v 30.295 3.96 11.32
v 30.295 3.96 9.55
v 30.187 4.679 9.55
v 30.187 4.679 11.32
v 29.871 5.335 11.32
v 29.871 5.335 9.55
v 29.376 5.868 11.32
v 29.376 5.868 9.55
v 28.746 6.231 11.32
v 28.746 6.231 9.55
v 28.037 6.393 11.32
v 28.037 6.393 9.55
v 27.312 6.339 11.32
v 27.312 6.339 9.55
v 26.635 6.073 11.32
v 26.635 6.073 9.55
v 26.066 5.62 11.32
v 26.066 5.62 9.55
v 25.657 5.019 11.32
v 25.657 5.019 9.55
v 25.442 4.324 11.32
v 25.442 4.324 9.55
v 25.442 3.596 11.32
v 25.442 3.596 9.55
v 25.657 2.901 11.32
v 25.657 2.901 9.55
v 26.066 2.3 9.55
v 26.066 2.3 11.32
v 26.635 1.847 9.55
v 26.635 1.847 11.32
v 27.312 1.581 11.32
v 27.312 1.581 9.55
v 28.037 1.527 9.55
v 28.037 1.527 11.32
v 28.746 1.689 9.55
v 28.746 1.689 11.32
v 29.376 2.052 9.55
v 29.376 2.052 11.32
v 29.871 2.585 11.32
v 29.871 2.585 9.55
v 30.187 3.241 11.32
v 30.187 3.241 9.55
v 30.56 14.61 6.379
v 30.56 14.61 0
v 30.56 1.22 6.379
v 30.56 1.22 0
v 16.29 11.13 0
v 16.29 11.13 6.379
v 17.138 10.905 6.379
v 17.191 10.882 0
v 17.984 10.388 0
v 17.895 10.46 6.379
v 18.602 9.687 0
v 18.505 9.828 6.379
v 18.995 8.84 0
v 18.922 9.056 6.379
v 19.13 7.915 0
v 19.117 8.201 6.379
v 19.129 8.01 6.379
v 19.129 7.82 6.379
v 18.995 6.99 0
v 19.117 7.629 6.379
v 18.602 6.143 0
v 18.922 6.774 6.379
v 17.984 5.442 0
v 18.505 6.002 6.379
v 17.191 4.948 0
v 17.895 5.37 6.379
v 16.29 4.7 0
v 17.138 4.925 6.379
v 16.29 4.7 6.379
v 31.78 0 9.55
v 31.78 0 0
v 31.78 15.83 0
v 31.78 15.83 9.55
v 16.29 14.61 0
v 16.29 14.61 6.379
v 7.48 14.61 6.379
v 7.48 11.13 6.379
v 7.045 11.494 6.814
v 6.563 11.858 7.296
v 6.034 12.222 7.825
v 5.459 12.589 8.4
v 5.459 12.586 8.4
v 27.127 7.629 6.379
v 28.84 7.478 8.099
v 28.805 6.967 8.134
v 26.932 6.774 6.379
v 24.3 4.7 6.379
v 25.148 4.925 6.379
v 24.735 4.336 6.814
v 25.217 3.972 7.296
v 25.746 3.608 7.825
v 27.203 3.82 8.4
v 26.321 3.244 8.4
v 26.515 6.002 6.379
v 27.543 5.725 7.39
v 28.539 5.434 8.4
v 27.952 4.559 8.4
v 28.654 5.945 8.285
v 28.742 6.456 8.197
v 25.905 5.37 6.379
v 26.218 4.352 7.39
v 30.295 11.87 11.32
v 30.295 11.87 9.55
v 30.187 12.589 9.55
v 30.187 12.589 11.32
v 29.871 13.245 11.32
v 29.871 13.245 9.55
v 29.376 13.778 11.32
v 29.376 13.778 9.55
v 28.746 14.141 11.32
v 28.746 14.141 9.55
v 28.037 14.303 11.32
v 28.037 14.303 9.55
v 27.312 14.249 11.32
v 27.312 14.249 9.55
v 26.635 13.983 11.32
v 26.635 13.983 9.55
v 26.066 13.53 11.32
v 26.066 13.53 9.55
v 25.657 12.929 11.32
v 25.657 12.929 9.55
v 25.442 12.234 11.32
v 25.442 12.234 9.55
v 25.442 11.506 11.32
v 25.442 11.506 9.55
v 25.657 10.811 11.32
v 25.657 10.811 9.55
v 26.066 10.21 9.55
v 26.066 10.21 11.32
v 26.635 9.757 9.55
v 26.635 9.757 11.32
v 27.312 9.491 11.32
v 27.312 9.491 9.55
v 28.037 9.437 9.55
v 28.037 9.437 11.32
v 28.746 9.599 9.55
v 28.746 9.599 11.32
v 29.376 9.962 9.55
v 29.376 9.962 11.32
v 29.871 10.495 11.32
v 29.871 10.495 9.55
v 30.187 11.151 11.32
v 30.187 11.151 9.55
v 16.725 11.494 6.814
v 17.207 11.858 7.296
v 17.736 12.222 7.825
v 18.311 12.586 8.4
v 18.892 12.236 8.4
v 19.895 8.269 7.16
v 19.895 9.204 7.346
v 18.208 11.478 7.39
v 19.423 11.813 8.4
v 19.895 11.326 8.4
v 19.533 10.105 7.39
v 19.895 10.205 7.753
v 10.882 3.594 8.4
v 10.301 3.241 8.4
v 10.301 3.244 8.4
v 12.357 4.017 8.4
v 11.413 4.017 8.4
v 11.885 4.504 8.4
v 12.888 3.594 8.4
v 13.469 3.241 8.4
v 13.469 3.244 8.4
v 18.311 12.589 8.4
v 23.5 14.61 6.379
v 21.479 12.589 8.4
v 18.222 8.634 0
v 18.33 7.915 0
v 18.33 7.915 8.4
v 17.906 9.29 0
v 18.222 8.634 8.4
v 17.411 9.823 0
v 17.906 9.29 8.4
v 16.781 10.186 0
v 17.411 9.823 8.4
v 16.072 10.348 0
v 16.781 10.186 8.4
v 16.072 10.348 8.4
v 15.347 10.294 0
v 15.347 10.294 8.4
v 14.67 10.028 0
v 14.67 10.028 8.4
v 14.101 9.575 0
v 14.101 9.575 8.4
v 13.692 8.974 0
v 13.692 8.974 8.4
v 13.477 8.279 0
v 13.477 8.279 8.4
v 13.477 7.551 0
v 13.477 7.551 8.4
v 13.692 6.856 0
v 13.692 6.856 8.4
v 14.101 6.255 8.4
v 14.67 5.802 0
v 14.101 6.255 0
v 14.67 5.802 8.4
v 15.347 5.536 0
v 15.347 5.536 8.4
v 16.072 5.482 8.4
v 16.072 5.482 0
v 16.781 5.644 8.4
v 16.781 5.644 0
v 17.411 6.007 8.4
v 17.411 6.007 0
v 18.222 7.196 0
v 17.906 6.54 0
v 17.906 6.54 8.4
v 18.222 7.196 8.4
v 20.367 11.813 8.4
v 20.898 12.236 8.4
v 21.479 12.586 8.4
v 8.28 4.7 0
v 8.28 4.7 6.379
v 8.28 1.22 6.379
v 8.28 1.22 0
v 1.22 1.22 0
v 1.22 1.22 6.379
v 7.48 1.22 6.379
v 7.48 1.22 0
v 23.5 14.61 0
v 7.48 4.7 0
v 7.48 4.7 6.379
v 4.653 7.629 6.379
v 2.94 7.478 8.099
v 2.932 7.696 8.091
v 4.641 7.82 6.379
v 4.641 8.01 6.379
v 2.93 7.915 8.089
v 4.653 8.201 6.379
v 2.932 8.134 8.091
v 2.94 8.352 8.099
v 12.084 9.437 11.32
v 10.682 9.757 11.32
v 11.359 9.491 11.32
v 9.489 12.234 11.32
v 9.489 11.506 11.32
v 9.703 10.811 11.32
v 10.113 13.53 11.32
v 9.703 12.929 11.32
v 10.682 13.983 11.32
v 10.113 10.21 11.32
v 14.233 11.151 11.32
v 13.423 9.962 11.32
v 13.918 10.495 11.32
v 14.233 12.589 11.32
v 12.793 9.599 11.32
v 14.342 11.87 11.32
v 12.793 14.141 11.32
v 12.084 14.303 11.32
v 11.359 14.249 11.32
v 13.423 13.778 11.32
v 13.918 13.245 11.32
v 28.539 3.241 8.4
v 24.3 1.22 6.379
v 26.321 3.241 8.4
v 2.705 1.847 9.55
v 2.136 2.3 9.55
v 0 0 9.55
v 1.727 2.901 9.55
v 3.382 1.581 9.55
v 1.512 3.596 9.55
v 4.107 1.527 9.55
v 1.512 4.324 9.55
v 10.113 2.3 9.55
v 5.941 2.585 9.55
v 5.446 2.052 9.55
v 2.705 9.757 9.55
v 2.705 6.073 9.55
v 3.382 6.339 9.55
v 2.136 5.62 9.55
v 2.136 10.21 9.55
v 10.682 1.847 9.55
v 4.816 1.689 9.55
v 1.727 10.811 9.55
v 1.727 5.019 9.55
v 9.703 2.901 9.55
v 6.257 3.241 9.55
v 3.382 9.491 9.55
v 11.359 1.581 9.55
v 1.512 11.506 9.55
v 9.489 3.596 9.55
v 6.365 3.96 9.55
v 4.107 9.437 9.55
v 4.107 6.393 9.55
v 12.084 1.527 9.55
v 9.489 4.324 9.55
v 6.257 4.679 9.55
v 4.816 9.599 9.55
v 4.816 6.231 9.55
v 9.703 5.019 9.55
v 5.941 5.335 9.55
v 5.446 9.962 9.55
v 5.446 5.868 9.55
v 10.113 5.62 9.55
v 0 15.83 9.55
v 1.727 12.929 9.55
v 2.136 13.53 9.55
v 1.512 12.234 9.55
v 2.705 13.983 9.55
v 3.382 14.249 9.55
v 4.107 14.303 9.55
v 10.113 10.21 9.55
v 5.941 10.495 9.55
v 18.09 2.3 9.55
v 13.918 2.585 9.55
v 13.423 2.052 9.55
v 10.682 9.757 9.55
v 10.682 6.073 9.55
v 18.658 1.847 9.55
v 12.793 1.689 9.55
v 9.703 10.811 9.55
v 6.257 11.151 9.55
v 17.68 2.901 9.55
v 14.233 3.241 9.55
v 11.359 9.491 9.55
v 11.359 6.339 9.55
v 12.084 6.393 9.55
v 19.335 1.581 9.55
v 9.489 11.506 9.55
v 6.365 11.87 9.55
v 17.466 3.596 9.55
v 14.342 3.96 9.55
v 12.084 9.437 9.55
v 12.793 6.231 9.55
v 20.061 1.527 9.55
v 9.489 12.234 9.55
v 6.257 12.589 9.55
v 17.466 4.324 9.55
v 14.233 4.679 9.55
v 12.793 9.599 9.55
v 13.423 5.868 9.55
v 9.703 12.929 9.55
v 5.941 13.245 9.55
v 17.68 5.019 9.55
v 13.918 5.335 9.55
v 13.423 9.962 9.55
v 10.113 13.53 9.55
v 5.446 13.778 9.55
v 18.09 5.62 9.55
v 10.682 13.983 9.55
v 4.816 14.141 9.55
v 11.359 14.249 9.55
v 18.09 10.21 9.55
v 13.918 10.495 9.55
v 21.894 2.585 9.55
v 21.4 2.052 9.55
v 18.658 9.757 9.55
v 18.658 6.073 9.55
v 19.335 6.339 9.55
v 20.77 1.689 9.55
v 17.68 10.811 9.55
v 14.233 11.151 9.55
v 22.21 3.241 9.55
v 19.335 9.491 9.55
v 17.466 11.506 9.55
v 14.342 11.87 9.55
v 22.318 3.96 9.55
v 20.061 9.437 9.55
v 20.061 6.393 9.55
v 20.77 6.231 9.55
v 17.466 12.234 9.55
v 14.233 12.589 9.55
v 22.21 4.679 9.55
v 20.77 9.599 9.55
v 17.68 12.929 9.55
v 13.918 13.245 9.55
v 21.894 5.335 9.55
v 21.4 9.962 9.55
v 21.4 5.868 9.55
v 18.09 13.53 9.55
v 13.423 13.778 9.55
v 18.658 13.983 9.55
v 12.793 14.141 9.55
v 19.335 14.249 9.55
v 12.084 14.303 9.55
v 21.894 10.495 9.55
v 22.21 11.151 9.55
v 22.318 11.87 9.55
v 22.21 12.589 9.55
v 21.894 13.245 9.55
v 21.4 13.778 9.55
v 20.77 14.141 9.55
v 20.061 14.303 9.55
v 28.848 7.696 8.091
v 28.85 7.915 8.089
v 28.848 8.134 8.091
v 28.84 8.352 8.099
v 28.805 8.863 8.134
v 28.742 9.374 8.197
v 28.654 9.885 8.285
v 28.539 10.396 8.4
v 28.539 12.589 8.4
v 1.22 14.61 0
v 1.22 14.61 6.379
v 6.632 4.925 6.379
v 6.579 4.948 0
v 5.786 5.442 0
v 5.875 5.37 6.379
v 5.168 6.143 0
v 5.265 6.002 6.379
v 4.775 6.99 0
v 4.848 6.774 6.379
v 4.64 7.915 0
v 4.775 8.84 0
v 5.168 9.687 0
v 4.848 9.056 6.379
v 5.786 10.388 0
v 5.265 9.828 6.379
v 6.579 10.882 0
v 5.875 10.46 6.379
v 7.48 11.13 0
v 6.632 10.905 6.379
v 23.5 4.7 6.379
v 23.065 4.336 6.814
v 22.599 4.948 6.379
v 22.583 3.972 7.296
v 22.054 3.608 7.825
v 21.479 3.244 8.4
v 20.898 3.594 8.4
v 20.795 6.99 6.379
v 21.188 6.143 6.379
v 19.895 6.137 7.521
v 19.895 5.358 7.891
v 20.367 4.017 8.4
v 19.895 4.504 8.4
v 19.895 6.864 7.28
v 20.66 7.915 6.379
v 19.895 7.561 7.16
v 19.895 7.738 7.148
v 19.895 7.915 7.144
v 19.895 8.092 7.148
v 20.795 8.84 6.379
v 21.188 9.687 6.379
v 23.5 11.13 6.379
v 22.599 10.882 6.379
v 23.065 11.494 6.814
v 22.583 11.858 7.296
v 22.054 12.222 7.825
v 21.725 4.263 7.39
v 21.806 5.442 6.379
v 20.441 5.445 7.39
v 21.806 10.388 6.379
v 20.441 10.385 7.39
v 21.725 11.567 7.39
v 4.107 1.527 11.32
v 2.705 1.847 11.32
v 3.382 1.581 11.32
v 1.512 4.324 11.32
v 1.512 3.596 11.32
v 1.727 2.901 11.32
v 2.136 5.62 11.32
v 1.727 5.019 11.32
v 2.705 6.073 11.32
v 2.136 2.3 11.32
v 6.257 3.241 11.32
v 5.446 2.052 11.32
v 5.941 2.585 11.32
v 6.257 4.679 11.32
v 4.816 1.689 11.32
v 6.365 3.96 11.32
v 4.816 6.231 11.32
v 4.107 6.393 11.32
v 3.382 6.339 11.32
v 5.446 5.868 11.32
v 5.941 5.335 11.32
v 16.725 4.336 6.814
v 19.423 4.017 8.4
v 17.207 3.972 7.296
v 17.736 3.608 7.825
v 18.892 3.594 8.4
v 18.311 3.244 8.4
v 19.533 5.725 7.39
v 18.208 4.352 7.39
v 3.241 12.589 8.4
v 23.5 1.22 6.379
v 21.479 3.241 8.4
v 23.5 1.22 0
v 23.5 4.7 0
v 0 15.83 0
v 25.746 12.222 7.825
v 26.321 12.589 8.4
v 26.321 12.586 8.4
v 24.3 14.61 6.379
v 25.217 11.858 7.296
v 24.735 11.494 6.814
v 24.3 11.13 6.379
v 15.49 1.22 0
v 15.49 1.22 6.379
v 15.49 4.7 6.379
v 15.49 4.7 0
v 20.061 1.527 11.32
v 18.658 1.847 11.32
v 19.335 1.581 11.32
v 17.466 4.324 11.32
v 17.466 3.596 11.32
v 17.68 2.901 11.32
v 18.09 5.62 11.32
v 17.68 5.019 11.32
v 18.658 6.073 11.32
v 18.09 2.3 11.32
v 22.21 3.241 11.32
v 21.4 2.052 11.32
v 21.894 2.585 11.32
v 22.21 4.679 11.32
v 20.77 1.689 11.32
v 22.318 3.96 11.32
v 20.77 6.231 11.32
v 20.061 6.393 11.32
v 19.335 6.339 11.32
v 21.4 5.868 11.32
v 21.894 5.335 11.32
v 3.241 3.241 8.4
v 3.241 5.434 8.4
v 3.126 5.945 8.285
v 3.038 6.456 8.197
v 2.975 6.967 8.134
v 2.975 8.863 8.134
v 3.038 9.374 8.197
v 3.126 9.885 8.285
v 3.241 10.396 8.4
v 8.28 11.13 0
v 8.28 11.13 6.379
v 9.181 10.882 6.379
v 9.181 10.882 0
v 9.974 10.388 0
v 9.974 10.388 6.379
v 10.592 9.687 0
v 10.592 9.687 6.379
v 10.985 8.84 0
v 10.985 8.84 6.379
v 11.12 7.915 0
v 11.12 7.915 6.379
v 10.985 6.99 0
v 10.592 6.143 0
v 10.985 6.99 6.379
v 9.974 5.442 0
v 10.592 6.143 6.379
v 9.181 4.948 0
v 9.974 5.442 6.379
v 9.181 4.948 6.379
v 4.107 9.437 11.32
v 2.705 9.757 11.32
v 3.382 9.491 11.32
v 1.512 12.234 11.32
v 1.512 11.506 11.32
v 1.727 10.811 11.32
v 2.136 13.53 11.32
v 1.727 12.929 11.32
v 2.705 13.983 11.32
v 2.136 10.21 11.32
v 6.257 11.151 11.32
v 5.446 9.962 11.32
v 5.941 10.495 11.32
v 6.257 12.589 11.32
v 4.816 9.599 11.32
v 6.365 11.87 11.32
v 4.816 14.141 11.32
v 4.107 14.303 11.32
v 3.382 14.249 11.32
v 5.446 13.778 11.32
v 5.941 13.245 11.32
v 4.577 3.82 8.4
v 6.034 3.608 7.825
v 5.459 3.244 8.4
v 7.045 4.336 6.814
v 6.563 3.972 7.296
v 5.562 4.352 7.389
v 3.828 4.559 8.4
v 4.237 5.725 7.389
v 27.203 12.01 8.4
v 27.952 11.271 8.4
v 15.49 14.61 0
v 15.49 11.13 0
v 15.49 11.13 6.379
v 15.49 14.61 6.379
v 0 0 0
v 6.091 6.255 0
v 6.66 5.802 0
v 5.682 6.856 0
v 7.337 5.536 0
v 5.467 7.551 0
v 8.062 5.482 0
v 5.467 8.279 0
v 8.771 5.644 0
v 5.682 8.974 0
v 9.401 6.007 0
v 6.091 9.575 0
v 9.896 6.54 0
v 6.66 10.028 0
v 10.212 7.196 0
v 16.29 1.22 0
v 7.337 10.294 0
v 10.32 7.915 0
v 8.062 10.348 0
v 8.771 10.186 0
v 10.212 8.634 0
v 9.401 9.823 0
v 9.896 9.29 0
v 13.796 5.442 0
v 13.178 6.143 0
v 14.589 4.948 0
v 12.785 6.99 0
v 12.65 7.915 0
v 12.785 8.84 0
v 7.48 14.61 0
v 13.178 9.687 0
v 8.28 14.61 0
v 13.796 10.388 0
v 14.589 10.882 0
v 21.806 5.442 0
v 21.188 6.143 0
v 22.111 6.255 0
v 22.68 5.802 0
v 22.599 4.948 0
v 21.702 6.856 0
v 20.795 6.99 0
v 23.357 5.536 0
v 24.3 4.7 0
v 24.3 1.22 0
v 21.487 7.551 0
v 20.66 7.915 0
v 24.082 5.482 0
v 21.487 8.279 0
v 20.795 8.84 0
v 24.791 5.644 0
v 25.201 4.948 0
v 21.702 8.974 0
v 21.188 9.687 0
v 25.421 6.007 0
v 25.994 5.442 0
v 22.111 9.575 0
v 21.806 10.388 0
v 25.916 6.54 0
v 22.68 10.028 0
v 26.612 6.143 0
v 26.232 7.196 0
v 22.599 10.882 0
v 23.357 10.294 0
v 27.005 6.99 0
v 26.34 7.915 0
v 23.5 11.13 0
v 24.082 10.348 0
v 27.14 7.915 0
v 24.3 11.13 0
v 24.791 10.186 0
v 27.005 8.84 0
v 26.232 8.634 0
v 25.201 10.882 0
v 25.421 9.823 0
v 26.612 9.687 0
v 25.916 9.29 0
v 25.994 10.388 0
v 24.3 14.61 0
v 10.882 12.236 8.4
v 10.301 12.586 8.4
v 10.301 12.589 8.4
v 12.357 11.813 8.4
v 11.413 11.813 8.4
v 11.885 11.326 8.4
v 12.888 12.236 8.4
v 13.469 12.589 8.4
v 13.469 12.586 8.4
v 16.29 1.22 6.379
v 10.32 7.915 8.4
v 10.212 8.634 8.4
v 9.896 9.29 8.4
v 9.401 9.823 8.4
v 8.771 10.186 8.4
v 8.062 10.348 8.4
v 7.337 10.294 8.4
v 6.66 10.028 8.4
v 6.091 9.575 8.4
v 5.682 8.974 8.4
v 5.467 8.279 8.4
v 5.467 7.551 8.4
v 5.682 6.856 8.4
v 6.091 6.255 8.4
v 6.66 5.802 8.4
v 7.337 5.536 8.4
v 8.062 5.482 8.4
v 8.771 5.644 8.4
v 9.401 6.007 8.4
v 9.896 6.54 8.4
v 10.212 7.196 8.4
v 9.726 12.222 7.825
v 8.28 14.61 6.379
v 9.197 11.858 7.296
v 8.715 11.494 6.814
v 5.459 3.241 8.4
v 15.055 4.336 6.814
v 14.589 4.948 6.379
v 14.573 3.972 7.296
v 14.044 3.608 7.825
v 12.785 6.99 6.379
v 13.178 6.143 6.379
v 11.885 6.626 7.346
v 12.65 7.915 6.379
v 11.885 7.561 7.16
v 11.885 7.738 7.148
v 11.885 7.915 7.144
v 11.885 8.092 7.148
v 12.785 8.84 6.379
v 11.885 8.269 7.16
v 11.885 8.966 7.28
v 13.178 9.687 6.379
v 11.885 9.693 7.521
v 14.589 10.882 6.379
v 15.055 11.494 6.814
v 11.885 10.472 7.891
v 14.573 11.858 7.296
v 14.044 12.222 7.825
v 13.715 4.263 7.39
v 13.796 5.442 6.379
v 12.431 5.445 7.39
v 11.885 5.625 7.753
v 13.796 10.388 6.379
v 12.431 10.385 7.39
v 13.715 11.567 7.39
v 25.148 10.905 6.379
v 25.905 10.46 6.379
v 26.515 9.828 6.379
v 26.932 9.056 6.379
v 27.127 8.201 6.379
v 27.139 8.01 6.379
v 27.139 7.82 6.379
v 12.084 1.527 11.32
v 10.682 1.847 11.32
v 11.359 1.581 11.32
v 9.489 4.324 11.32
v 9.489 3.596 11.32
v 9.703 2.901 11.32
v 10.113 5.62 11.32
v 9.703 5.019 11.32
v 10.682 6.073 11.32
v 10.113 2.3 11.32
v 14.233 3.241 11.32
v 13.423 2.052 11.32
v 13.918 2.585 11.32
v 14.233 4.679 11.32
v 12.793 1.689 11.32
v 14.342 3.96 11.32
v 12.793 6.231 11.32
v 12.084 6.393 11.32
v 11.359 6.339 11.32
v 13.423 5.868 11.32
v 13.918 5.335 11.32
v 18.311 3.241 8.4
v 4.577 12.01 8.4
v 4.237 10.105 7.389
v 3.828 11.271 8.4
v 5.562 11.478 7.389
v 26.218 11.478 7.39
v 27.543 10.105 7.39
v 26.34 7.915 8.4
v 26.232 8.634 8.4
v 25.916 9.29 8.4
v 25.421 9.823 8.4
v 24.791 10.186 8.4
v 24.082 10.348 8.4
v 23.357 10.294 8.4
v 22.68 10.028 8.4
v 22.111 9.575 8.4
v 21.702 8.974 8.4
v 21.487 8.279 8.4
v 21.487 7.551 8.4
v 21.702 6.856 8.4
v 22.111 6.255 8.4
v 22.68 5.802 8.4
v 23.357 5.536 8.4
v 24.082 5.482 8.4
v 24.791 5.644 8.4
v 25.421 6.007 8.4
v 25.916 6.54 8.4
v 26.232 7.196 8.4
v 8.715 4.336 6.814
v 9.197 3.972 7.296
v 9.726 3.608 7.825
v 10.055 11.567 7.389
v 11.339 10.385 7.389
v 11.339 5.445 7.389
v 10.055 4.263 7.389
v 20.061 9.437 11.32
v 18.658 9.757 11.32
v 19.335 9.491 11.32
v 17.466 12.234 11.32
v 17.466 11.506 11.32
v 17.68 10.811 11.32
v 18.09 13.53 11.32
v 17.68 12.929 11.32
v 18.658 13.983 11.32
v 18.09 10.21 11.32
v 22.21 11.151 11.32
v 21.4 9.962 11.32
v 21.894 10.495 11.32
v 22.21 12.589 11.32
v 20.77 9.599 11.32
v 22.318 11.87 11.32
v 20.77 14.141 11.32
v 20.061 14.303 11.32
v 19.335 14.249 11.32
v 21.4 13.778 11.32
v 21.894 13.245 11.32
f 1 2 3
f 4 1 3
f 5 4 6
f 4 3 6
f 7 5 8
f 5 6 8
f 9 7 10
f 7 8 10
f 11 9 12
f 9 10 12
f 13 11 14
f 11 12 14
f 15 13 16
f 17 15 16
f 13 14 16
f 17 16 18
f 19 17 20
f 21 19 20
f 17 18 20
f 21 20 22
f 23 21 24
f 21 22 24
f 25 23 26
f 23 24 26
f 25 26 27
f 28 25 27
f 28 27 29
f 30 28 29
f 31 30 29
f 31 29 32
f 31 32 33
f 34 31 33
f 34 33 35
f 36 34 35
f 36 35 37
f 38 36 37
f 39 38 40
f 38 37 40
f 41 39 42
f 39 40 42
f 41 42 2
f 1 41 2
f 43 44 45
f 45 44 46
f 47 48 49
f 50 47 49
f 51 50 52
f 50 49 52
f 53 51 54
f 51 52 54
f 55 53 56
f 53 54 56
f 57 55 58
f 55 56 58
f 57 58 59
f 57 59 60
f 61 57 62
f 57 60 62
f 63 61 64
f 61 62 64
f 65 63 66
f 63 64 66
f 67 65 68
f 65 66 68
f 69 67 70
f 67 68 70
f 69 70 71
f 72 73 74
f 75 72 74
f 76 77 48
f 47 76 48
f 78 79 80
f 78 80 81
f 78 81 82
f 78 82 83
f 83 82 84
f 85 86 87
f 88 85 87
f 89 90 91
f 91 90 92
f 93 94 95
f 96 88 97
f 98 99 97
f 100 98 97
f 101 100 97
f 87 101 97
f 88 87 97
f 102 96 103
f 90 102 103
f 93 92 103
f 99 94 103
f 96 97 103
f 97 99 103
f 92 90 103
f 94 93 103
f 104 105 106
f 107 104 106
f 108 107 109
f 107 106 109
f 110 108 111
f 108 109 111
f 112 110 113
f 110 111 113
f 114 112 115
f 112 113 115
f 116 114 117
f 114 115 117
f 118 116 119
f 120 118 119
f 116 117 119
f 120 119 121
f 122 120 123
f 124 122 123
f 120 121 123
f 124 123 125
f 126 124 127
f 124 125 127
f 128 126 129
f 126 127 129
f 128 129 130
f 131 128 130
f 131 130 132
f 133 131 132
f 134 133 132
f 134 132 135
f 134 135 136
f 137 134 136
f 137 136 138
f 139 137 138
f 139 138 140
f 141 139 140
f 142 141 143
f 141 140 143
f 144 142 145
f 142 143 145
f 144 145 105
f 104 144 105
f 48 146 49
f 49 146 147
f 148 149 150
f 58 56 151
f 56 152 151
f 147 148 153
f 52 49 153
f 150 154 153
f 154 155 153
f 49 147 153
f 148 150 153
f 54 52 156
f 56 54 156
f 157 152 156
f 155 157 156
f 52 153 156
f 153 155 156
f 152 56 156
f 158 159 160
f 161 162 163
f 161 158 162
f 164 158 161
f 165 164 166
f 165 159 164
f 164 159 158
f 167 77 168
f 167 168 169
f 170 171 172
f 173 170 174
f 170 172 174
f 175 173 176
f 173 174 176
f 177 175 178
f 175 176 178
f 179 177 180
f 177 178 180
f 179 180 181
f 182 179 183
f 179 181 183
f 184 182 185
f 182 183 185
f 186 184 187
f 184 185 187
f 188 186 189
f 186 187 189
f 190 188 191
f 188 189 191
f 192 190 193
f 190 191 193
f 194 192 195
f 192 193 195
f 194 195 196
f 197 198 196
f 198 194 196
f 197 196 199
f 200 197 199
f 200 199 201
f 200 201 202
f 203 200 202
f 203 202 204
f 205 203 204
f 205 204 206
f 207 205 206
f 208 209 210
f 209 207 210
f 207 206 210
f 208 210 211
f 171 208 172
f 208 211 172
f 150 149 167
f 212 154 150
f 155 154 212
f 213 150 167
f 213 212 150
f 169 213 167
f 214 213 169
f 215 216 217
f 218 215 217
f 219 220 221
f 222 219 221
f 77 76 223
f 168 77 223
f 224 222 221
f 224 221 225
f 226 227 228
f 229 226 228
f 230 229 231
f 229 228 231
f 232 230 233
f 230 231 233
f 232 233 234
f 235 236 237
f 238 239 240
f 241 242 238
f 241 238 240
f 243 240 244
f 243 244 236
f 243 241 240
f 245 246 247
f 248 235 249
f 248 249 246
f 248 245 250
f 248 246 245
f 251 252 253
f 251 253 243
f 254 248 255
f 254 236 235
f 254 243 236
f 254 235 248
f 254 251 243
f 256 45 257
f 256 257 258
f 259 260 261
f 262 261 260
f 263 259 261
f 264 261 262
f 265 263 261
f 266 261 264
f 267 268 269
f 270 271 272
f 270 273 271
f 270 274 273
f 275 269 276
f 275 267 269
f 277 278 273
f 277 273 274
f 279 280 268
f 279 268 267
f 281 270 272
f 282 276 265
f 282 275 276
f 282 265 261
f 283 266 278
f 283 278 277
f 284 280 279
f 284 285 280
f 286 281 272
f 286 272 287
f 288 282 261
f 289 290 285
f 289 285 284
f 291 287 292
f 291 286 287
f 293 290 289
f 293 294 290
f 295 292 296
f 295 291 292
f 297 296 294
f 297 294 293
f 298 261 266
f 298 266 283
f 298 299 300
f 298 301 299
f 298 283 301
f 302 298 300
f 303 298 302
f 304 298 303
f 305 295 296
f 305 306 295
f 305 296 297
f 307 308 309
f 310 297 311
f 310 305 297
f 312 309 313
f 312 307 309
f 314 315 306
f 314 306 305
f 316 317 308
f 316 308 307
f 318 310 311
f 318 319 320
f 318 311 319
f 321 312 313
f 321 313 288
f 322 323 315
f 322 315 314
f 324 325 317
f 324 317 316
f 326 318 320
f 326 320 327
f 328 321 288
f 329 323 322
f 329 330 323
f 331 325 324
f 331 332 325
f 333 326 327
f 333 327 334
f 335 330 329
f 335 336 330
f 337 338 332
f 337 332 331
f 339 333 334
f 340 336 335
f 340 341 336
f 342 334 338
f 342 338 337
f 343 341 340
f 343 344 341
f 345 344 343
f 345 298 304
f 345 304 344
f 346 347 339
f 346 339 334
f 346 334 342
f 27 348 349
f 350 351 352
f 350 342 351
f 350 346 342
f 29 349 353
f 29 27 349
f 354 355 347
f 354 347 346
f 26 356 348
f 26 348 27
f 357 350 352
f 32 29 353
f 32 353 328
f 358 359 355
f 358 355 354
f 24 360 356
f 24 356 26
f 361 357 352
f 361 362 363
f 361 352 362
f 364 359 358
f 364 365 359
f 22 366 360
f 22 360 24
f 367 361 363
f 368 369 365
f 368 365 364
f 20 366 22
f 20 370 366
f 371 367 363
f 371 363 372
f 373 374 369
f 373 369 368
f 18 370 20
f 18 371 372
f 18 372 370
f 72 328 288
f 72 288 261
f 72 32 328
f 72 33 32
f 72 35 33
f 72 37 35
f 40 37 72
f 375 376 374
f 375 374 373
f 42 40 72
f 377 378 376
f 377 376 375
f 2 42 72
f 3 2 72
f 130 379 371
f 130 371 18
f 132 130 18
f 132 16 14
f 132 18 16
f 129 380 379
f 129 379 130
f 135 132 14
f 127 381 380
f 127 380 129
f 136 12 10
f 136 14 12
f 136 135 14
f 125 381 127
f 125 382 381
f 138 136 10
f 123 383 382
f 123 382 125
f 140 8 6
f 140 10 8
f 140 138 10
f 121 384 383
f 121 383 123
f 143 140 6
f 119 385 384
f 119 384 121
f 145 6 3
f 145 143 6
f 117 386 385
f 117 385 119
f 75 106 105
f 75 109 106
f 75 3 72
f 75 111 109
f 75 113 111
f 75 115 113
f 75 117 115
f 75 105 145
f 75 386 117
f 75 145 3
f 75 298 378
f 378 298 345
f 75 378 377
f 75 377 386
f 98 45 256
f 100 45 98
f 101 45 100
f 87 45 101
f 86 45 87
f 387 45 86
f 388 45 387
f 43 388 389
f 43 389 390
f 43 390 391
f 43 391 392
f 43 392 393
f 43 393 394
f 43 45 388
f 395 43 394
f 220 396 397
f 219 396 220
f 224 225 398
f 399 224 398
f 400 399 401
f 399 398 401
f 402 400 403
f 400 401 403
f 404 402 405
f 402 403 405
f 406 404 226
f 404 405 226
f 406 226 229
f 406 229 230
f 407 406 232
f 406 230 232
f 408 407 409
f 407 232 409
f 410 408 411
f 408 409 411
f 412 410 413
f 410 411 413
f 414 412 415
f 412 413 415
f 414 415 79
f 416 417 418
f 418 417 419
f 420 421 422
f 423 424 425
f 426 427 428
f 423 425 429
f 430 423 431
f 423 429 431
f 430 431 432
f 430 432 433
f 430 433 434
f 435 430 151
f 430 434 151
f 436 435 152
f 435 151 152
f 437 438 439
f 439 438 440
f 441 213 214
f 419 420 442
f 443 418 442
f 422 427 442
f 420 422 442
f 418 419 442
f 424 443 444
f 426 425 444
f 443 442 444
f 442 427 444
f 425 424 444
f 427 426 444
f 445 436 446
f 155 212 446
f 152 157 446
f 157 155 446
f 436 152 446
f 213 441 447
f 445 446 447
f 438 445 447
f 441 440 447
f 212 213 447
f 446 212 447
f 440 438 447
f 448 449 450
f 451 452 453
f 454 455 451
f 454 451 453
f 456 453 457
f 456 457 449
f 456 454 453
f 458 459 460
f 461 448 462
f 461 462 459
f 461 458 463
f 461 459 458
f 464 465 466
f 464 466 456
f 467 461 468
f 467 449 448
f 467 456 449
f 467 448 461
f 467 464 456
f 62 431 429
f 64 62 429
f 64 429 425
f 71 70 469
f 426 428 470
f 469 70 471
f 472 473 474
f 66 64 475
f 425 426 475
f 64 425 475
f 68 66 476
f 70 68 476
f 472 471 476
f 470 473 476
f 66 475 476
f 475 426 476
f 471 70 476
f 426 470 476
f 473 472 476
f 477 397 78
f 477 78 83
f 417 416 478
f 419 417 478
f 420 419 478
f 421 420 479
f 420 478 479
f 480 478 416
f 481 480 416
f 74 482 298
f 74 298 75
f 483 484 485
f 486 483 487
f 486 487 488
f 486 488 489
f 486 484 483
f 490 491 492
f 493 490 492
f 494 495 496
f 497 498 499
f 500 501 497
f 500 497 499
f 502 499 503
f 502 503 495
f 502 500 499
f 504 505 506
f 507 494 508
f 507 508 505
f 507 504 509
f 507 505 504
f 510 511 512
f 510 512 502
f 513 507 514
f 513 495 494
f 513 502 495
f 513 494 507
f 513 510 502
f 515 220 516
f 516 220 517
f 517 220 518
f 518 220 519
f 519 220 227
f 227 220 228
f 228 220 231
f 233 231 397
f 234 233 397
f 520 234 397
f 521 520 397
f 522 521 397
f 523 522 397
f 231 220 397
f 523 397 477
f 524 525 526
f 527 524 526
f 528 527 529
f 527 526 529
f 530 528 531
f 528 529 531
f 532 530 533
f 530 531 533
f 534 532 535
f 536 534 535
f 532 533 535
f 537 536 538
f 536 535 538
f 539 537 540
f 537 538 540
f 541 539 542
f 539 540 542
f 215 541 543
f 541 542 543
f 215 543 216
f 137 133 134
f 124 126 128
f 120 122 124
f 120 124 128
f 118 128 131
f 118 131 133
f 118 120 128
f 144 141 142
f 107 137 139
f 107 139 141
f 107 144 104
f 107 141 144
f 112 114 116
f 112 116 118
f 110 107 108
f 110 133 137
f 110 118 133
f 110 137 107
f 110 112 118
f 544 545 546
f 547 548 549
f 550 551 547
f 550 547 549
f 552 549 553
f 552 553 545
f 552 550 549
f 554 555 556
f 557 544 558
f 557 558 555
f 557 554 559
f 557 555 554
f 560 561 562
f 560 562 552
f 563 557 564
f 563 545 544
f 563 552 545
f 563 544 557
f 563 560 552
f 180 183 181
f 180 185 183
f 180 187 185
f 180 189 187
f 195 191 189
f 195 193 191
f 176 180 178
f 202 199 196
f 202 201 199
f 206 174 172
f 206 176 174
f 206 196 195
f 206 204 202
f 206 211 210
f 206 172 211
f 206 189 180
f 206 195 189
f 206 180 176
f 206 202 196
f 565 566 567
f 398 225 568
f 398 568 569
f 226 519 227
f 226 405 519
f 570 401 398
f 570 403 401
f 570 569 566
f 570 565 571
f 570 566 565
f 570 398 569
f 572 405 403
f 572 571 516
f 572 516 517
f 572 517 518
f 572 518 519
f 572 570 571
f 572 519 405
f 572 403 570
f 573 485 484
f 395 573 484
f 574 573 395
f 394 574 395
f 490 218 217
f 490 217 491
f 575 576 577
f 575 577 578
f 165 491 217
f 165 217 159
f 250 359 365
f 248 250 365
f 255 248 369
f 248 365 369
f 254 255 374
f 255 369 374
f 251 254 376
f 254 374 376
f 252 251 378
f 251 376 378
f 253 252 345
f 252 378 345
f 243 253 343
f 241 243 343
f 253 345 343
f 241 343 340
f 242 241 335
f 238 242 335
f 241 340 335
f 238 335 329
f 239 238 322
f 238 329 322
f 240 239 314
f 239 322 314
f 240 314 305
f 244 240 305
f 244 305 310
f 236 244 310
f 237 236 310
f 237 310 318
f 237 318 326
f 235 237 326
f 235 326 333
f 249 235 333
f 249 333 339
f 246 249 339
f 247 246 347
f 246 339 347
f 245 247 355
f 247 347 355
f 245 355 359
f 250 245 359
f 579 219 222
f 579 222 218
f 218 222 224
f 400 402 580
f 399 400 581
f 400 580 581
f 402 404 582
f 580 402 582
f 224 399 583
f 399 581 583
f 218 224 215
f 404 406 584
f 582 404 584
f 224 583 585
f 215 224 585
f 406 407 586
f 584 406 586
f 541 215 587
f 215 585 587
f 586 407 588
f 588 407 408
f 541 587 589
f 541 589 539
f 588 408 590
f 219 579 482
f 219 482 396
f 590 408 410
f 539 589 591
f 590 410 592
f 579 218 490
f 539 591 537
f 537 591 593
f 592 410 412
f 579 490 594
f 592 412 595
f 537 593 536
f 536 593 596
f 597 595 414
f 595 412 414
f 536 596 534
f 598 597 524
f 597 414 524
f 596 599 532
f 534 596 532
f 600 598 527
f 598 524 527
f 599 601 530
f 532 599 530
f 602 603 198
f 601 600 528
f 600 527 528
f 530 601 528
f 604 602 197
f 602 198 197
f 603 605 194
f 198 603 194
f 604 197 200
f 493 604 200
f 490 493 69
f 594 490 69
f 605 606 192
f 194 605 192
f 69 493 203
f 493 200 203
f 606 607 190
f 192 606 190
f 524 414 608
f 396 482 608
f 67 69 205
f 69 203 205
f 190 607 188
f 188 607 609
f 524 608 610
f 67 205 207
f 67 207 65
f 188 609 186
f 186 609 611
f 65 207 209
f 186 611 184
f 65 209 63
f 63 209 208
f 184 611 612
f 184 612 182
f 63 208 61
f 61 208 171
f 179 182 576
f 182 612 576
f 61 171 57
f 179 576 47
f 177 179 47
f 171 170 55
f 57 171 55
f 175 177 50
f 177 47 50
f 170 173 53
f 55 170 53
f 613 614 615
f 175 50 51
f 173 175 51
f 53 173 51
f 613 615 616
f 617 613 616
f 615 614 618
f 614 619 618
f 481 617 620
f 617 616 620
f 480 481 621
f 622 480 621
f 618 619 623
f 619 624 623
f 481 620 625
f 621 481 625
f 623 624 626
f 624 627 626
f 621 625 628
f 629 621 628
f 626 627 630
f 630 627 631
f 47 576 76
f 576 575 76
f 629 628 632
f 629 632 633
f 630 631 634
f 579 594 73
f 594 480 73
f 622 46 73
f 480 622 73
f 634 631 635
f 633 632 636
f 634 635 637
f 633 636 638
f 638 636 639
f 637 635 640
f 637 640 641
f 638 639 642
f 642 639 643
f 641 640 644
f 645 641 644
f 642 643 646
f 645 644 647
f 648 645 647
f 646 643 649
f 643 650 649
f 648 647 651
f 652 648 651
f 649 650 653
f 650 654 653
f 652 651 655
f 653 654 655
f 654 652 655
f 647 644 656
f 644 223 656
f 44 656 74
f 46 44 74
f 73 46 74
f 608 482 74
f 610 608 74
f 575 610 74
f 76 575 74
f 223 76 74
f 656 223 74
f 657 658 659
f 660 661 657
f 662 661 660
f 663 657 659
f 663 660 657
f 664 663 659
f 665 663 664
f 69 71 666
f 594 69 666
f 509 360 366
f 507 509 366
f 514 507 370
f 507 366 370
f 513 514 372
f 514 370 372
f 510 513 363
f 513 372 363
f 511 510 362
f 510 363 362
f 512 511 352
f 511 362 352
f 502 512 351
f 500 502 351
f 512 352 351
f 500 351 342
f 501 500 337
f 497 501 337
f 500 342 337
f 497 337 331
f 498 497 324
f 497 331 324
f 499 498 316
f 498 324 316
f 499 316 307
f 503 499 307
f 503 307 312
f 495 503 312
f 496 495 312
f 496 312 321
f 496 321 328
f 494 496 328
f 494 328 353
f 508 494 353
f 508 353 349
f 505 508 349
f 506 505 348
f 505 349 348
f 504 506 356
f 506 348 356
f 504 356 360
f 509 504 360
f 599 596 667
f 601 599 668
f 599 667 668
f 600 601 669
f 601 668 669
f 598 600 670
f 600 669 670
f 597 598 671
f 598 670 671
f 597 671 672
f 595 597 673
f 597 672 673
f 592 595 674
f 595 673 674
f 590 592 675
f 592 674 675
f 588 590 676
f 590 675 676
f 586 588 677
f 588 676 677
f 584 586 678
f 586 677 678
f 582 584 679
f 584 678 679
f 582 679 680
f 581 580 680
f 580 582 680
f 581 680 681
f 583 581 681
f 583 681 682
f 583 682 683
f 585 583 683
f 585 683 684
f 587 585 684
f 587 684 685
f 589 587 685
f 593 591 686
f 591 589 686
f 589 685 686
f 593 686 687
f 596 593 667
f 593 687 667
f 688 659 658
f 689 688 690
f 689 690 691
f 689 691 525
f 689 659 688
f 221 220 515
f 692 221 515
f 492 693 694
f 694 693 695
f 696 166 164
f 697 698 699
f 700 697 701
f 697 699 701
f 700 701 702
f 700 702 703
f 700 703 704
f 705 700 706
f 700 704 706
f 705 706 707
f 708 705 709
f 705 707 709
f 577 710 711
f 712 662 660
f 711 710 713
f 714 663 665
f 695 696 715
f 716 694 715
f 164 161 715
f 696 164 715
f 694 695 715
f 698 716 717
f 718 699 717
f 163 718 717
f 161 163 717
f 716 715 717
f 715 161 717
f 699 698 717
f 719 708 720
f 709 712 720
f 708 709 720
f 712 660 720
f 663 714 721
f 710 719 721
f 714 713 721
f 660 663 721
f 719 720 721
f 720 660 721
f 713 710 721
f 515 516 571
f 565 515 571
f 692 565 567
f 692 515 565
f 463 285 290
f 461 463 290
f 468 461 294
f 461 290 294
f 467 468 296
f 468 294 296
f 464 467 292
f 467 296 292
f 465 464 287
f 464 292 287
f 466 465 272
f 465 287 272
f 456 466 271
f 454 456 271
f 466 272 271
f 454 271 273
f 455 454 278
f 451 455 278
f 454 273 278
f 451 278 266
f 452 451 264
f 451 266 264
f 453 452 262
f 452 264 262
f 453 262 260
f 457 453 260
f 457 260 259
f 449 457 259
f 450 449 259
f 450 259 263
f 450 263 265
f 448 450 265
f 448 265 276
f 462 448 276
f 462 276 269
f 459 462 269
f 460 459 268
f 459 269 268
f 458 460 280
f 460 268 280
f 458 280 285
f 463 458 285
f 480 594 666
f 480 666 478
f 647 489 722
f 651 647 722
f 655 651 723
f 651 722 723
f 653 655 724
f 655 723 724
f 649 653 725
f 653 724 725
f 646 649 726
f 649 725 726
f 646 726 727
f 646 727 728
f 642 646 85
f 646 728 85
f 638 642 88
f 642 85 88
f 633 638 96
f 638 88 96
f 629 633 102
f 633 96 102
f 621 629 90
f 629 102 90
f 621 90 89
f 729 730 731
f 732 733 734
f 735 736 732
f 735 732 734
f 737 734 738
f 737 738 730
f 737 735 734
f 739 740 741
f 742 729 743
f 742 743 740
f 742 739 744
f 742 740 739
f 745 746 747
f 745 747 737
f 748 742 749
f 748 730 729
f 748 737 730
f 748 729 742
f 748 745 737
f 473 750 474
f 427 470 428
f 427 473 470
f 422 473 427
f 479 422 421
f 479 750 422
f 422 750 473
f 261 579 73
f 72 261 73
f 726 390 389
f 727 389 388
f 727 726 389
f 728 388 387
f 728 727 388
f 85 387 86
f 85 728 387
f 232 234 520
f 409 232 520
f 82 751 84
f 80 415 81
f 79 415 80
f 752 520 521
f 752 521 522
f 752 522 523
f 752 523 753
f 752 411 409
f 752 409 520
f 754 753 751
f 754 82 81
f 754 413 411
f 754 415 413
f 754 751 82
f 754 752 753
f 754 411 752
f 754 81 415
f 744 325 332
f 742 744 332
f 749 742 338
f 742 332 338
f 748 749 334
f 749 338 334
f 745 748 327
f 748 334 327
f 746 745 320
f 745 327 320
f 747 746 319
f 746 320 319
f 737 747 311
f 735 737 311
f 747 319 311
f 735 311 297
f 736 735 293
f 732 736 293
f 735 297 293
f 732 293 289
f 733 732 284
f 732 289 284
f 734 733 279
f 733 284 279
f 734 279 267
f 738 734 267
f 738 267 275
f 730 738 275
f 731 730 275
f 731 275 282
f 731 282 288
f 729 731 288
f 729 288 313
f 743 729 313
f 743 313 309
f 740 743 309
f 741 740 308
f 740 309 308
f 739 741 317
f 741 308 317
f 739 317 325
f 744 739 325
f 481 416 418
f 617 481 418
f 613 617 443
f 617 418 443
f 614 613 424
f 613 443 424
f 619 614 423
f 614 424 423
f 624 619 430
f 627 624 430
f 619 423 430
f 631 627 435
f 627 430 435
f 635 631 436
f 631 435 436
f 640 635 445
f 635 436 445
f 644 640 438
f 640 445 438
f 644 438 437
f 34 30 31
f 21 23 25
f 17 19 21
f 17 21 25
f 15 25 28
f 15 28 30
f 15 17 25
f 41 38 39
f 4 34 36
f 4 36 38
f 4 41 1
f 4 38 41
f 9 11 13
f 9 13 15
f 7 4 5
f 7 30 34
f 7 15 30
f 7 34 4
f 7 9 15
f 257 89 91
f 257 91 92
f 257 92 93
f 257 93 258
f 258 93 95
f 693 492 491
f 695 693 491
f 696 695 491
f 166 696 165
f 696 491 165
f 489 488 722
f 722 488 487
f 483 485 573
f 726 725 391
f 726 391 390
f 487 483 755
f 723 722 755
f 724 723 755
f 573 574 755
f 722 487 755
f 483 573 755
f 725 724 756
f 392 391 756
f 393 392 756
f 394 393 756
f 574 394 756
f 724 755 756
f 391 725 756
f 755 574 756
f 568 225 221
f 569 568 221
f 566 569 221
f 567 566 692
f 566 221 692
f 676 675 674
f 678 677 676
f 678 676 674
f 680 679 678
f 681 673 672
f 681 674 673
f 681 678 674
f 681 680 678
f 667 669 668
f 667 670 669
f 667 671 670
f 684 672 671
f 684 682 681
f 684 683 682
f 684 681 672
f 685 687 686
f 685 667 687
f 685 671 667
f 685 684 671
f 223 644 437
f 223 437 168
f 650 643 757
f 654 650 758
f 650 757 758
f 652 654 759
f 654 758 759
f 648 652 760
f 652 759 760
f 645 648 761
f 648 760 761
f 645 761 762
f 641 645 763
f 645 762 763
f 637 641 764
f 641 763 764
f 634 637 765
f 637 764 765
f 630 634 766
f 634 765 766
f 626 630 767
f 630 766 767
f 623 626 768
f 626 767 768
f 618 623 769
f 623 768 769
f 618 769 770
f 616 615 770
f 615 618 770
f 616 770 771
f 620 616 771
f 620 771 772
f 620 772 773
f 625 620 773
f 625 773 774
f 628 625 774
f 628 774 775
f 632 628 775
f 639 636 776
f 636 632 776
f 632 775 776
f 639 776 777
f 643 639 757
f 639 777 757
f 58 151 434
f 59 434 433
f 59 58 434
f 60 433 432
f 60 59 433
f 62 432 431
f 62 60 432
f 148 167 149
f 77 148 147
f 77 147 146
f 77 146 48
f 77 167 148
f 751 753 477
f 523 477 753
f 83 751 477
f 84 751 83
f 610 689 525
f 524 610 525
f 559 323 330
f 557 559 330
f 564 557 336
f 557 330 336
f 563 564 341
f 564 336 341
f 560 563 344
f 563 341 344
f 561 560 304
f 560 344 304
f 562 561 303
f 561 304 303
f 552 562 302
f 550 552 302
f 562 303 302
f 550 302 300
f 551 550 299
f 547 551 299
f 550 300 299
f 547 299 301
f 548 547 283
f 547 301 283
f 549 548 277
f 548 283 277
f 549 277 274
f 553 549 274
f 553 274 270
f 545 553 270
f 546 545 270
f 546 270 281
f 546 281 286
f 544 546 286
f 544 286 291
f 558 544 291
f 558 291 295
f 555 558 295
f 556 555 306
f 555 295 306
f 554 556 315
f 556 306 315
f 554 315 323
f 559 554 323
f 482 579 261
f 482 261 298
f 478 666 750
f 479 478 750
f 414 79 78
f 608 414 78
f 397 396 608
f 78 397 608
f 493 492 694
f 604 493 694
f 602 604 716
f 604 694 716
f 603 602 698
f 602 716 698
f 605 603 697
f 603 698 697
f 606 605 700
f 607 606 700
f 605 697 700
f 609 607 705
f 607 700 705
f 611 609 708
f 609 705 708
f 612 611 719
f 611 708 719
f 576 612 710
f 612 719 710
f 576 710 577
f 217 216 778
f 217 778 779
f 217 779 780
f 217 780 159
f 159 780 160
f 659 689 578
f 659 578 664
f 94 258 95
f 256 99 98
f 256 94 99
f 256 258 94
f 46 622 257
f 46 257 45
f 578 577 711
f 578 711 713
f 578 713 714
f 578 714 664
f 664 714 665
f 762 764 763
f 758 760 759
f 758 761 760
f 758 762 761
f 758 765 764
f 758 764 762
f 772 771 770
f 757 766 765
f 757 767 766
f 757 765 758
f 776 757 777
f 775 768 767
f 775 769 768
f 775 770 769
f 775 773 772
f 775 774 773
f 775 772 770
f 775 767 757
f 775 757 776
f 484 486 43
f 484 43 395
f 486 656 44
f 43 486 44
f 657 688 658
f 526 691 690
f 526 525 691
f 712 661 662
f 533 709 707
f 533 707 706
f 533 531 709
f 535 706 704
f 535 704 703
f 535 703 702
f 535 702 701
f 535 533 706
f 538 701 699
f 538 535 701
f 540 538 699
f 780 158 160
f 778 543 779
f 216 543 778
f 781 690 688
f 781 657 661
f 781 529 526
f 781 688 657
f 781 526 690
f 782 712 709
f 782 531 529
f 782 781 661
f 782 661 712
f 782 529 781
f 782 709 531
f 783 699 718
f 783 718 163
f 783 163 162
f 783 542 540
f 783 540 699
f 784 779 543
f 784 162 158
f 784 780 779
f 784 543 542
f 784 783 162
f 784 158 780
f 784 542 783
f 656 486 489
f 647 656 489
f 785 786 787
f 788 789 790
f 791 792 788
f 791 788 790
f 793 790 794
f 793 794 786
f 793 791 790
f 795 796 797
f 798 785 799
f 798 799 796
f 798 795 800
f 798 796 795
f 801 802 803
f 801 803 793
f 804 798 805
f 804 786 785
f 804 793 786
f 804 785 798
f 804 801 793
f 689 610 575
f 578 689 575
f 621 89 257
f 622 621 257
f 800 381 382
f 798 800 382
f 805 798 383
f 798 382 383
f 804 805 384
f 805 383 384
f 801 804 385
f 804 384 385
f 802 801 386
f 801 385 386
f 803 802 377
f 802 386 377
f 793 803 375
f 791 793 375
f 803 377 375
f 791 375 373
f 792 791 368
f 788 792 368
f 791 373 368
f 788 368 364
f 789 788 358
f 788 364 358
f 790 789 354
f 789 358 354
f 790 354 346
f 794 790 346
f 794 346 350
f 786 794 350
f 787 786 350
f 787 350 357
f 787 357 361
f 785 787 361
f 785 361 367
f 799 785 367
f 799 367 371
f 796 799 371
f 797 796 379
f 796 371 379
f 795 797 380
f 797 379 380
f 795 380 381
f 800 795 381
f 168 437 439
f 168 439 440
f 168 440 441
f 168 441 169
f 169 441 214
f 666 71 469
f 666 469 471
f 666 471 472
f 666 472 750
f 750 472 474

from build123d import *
from build123d import SkipClean  # not in build123d's __all__

# Parameters (mm, degrees)
F0_W         = 31.78
F0_H         = 15.83
F1_DEPTH     = 9.55
F2_R         = 2.44
F3_DEPTH     = 1.77
F4_W         = 29.34
F4_H         = 13.39
F5_DEPTH     = 8.4
F6_R         = 2.44
F7_DEPTH     = 8.4
F8_T1_DEPTH  = 17.6047426374
F8_T3_DEPTH  = 17.6047426374
F8_T5_DEPTH  = 11.4573713187
F8_T7_DEPTH  = 11.4573713187
F8_T9_DEPTH  = 13.39
F8_T14_DEPTH = 8.6771574844
F8_S15_R     = 2.44
F8_T16_DEPTH = 6
F8_T18_ANGLE = 349.8869381759
F8_T22_DEPTH = 8.6771574844
F8_S23_R     = 2.44
F8_T24_DEPTH = 6
F8_T28_DEPTH = 8.6771574844
F8_S29_R     = 2.44
F8_T30_DEPTH = 6
F8_T32_ANGLE = 349.8869381759
F8_T36_DEPTH = 8.6771574844
F8_S37_R     = 2.44
F8_T38_DEPTH = 6
F8_T42_DEPTH = 8.6771574844
F8_S43_R     = 2.44
F8_T44_DEPTH = 6
F8_T46_ANGLE = 349.8869381759
F8_T50_DEPTH = 8.6771574844
F8_S51_R     = 2.44
F8_T52_DEPTH = 6
F8_T56_DEPTH = 8.6771574844
F8_S57_R     = 2.44
F8_T58_DEPTH = 6
F8_T60_ANGLE = 349.8869381759
F8_T64_DEPTH = 8.6771574844
F8_S65_R     = 2.44
F8_T66_DEPTH = 6
F8_T70_DEPTH = 8.6771574844
F8_S71_R     = 2.44
F8_T72_DEPTH = 6
F8_T76_DEPTH = 8.6771574844
F8_S77_R     = 2.44
F8_T78_DEPTH = 6
F8_T80_ANGLE = 349.8869381759
F8_T84_DEPTH = 8.6771574844
F8_S85_R     = 2.44
F8_T86_DEPTH = 6
F8_T88_ANGLE = 349.8869381759
F8_T92_DEPTH = 8.6771574844
F8_S93_R     = 2.44
F8_T94_DEPTH = 6


# Not quite as in the source:
# - a fillet or chamfer that OpenCascade refuses, or shapes differently, is made with other operations: its cross-section is extruded or revolved along the edge and cut away or added


with BuildPart() as f1:
    # F0 (on Top) → F1 (new body)
    with BuildSketch(Plane.XY):
        with Locations((15.89, 7.915)):
            Rectangle(F0_W, F0_H)
    extrude(amount=F1_DEPTH)

    # F2 (on face) → F3 (join)
    with BuildSketch(Plane.XY.offset(9.55)):
        with Locations((27.855, 3.96)):
            Circle(F2_R)
        with Locations((27.855, 11.87)):
            Circle(F2_R)
        with Locations((19.8783333333, 3.96)):
            Circle(F2_R)
        with Locations((19.8783333333, 11.87)):
            Circle(F2_R)
        with Locations((11.9016666667, 3.96)):
            Circle(F2_R)
        with Locations((11.9016666667, 11.87)):
            Circle(F2_R)
        with Locations((3.925, 3.96)):
            Circle(F2_R)
        with Locations((3.925, 11.87)):
            Circle(F2_R)
    extrude(amount=F3_DEPTH)

    # F4 (on face) → F5 (cut)
    with BuildSketch(Plane(origin=(0, 0, 0), x_dir=(1, 0, 0), z_dir=(0, 0, -1))):
        with Locations((15.89, -7.915)):
            Rectangle(F4_W, F4_H)
    extrude(amount=-F5_DEPTH, mode=Mode.SUBTRACT)

    # F6 (on face) → F7 (join, through all)
    with BuildSketch(Plane(origin=(0, 0, 8.4), x_dir=(1, 0, 0), z_dir=(0, 0, -1))):
        with BuildLine():
            Line((15.49, -1.22), (15.49, -4.6997861657))
            ThreePointArc((15.49, -4.6997861657), (12.65, -7.915), (15.49, -11.1302138343))
            Line((15.49, -11.1302138343), (15.49, -14.61))
            Line((15.49, -14.61), (16.29, -14.61))
            Line((16.29, -14.61), (16.29, -11.1302138343))
            ThreePointArc((16.29, -11.1302138343), (19.13, -7.915), (16.29, -4.6997861657))
            Line((16.29, -4.6997861657), (16.29, -1.22))
            Line((16.29, -1.22), (15.49, -1.22))
        make_face()
        with Locations((15.89, -7.915)):
            Circle(F6_R, mode=Mode.SUBTRACT)
        with BuildLine():
            Line((24.3, -14.61), (24.3, -11.1302138343))
            ThreePointArc((24.3, -11.1302138343), (27.14, -7.915), (24.3, -4.6997861657))
            Line((24.3, -4.6997861657), (24.3, -1.22))
            Line((24.3, -1.22), (23.5, -1.22))
            Line((23.5, -1.22), (23.5, -4.6997861657))
            ThreePointArc((23.5, -4.6997861657), (20.66, -7.915), (23.5, -11.1302138343))
            Line((23.5, -11.1302138343), (23.5, -14.61))
            Line((23.5, -14.61), (24.3, -14.61))
        make_face()
        with Locations((23.9, -7.915)):
            Circle(F6_R, mode=Mode.SUBTRACT)
        with BuildLine():
            ThreePointArc((8.28, -11.1302138343), (11.12, -7.915), (8.28, -4.6997861657))
            Line((8.28, -4.6997861657), (8.28, -1.22))
            Line((8.28, -1.22), (7.48, -1.22))
            Line((7.48, -1.22), (7.48, -4.6997861657))
            ThreePointArc((7.48, -4.6997861657), (4.64, -7.915), (7.48, -11.1302138343))
            Line((7.48, -11.1302138343), (7.48, -14.61))
            Line((7.48, -14.61), (8.28, -14.61))
            Line((8.28, -14.61), (8.28, -11.1302138343))
        make_face()
        with Locations((7.88, -7.915)):
            Circle(F6_R, mode=Mode.SUBTRACT)
    extrude(amount=F7_DEPTH)

    # F8: chamfer of 2.021 on 28 edges, made by hand

    # F8_s2 → F8_t1 (join)
    with BuildSketch(Plane.YZ.offset(3.0826286813)):
        Polygon((1.22, 6.379), (3.241, 8.4), (1.22, 8.4), align=None)
        Polygon((14.61, 6.379), (12.589, 8.4), (14.61, 8.4), align=None)
    extrude(amount=F8_T1_DEPTH)

    # F8_s4 → F8_t3 (join)
    with BuildSketch(Plane.YZ.offset(11.0926286813)):
        Polygon((1.22, 6.379), (3.241, 8.4), (1.22, 8.4), align=None)
        Polygon((14.61, 6.379), (12.589, 8.4), (14.61, 8.4), align=None)
    extrude(amount=F8_T3_DEPTH)

    # F8_s6 → F8_t5 (join)
    with BuildSketch(Plane.YZ.offset(19.1026286813)):
        Polygon((1.22, 6.379), (3.241, 8.4), (1.22, 8.4), align=None)
        Polygon((14.61, 6.379), (12.589, 8.4), (14.61, 8.4), align=None)
    extrude(amount=F8_T5_DEPTH)

    # F8_s8 → F8_t7 (join)
    with BuildSketch(Plane.YZ.offset(1.22)):
        Polygon((1.22, 6.379), (3.241, 8.4), (1.22, 8.4), align=None)
        Polygon((14.61, 6.379), (12.589, 8.4), (14.61, 8.4), align=None)
    extrude(amount=F8_T7_DEPTH)

    # F8_s10 → F8_t9 (join)
    with BuildSketch(Plane.XZ.offset(-14.61)):
        Polygon((30.56, 6.379), (28.539, 8.4), (30.56, 8.4), align=None)
        Polygon((1.22, 6.379), (3.241, 8.4), (1.22, 8.4), align=None)
    extrude(amount=F8_T9_DEPTH)


with BuildPart() as f8_tool12:
    # F8_s13 → F8_t14 (new body)
    with BuildSketch(Plane.XZ.offset(-1.22)):
        Polygon((15.49, 6.379), (13.469, 8.4), (15.49, 8.4), align=None)
    extrude(amount=-F8_T14_DEPTH)

    # F8_s15 → F8_t16 (cut, symmetric)
    with BuildSketch(Plane.XY.offset(7.4)):
        with Locations((15.89, 7.915)):
            Circle(F8_S15_R)
    extrude(amount=F8_T16_DEPTH, both=True, mode=Mode.SUBTRACT)


with BuildPart() as f1_1:
    add(f1.part, clean=False)

    # F8_t11: union F8_tool12
    add(f8_tool12.part)

    # F8_s17 → F8_t18 (revolve)
    with BuildSketch(Plane(origin=(0.8183420867, 9.2485847883, 0), x_dir=(0, 0, 1), z_dir=(0.0881385962, 0.996108221, 0))):
        Polygon((6.379, 18.370542642), (8.4, 20.391542642), (8.4, 18.370542642), align=None)
    revolve(axis=Axis((15.89, 7.915, 8.4), (0, 0, -1)), revolution_arc=F8_T18_ANGLE)


with BuildPart() as f8_tool20:
    # F8_s21 → F8_t22 (new body)
    with BuildSketch(Plane.XZ.offset(-5.9328425156)):
        Polygon((15.49, 6.379), (13.469, 8.4), (15.49, 8.4), align=None)
    extrude(amount=-F8_T22_DEPTH)

    # F8_s23 → F8_t24 (cut, symmetric)
    with BuildSketch(Plane.XY.offset(7.4)):
        with Locations((15.89, 7.915)):
            Circle(F8_S23_R)
    extrude(amount=F8_T24_DEPTH, both=True, mode=Mode.SUBTRACT)


with BuildPart() as f1_2:
    add(f1_1.part, clean=False)

    # F8_t19: union F8_tool20
    add(f8_tool20.part)


with BuildPart() as f8_tool26:
    # F8_s27 → F8_t28 (new body)
    with BuildSketch(Plane.XZ.offset(-14.61)):
        Polygon((10.301, 8.4), (8.28, 6.379), (8.28, 8.4), align=None)
    extrude(amount=F8_T28_DEPTH)

    # F8_s29 → F8_t30 (cut, symmetric)
    with BuildSketch(Plane.XY.offset(7.4)):
        with Locations((7.88, 7.915)):
            Circle(F8_S29_R)
    extrude(amount=F8_T30_DEPTH, both=True, mode=Mode.SUBTRACT)


with BuildPart() as f1_3:
    add(f1_2.part, clean=False)

    # F8_t25: union F8_tool26
    add(f8_tool26.part)

    # F8_s31 → F8_t32 (revolve)
    with BuildSketch(Plane(origin=(0.7561171055, 8.5453421904, 0), x_dir=(0, 0, 1), z_dir=(-0.0881385962, -0.996108221, 0))):
        Polygon((8.4, -1.8907157922), (6.379, -3.9117157922), (8.4, -3.9117157922), align=None)
    revolve(axis=Axis((7.88, 7.915, 8.4), (0, 0, -1)), revolution_arc=F8_T32_ANGLE)


with BuildPart() as f8_tool34:
    # F8_s35 → F8_t36 (new body)
    with BuildSketch(Plane.XZ.offset(-9.8971574844)):
        Polygon((8.28, 6.379), (10.301, 8.4), (8.28, 8.4), align=None)
    extrude(amount=F8_T36_DEPTH)

    # F8_s37 → F8_t38 (cut, symmetric)
    with BuildSketch(Plane.XY.offset(7.4)):
        with Locations((7.88, 7.915)):
            Circle(F8_S37_R)
    extrude(amount=F8_T38_DEPTH, both=True, mode=Mode.SUBTRACT)


with BuildPart() as f1_4:
    add(f1_3.part, clean=False)

    # F8_t33: union F8_tool34
    add(f8_tool34.part)


with BuildPart() as f8_tool40:
    # F8_s41 → F8_t42 (new body)
    with BuildSketch(Plane.XZ.offset(-1.22)):
        Polygon((23.5, 6.379), (21.479, 8.4), (23.5, 8.4), align=None)
    extrude(amount=-F8_T42_DEPTH)

    # F8_s43 → F8_t44 (cut, symmetric)
    with BuildSketch(Plane.XY.offset(7.4)):
        with Locations((23.9, 7.915)):
            Circle(F8_S43_R)
    extrude(amount=F8_T44_DEPTH, both=True, mode=Mode.SUBTRACT)


with BuildPart() as f1_5:
    add(f1_4.part, clean=False)

    # F8_t39: union F8_tool40
    add(f8_tool40.part)

    # F8_s45 → F8_t46 (revolve)
    with BuildSketch(Plane(origin=(0.880567068, 9.9518273862, 0), x_dir=(0, 0, 1), z_dir=(0.0881385962, 0.996108221, 0))):
        Polygon((6.379, 26.3493694919), (8.4, 28.3703694919), (8.4, 26.3493694919), align=None)
    revolve(axis=Axis((23.9, 7.915, 8.4), (0, 0, -1)), revolution_arc=F8_T46_ANGLE)


with BuildPart() as f8_tool48:
    # F8_s49 → F8_t50 (new body)
    with BuildSketch(Plane.XZ.offset(-5.9328425156)):
        Polygon((23.5, 6.379), (21.479, 8.4), (23.5, 8.4), align=None)
    extrude(amount=-F8_T50_DEPTH)

    # F8_s51 → F8_t52 (cut, symmetric)
    with BuildSketch(Plane.XY.offset(7.4)):
        with Locations((23.9, 7.915)):
            Circle(F8_S51_R)
    extrude(amount=F8_T52_DEPTH, both=True, mode=Mode.SUBTRACT)


with BuildPart() as f1_6:
    add(f1_5.part, clean=False)

    # F8_t47: union F8_tool48
    add(f8_tool48.part)


with BuildPart() as f8_tool54:
    # F8_s55 → F8_t56 (new body)
    with BuildSketch(Plane.XZ.offset(-14.61)):
        Polygon((18.311, 8.4), (16.29, 6.379), (16.29, 8.4), align=None)
    extrude(amount=F8_T56_DEPTH)

    # F8_s57 → F8_t58 (cut, symmetric)
    with BuildSketch(Plane.XY.offset(7.4)):
        with Locations((15.89, 7.915)):
            Circle(F8_S57_R)
    extrude(amount=F8_T58_DEPTH, both=True, mode=Mode.SUBTRACT)


with BuildPart() as f1_7:
    add(f1_6.part, clean=False)

    # F8_t53: union F8_tool54
    add(f8_tool54.part)

    # F8_s59 → F8_t60 (revolve)
    with BuildSketch(Plane(origin=(0.8183420867, 9.2485847883, 0), x_dir=(0, 0, 1), z_dir=(-0.0881385962, -0.996108221, 0))):
        Polygon((8.4, -9.869542642), (6.379, -11.890542642), (8.4, -11.890542642), align=None)
    with SkipClean():  # cleaning this boolean's faces spoils the solid; the shape is the same uncleaned
        revolve(axis=Axis((15.89, 7.915, 8.4), (0, 0, -1)), revolution_arc=F8_T60_ANGLE)


with BuildPart() as f8_tool62:
    # F8_s63 → F8_t64 (new body)
    with BuildSketch(Plane.XZ.offset(-9.8971574844)):
        Polygon((16.29, 6.379), (18.311, 8.4), (16.29, 8.4), align=None)
    extrude(amount=F8_T64_DEPTH)

    # F8_s65 → F8_t66 (cut, symmetric)
    with BuildSketch(Plane.XY.offset(7.4)):
        with Locations((15.89, 7.915)):
            Circle(F8_S65_R)
    extrude(amount=F8_T66_DEPTH, both=True, mode=Mode.SUBTRACT)


with BuildPart() as f1_8:
    add(f1_7.part, clean=False)

    # F8_t61: union F8_tool62
    add(f8_tool62.part)


with BuildPart() as f8_tool68:
    # F8_s69 → F8_t70 (new body)
    with BuildSketch(Plane.XZ.offset(-9.8971574844)):
        Polygon((24.3, 6.379), (26.321, 8.4), (24.3, 8.4), align=None)
    extrude(amount=F8_T70_DEPTH)

    # F8_s71 → F8_t72 (cut, symmetric)
    with BuildSketch(Plane.XY.offset(7.4)):
        with Locations((23.9, 7.915)):
            Circle(F8_S71_R)
    extrude(amount=F8_T72_DEPTH, both=True, mode=Mode.SUBTRACT)


with BuildPart() as f1_9:
    add(f1_8.part, clean=False)

    # F8_t67: union F8_tool68
    add(f8_tool68.part)


with BuildPart() as f8_tool74:
    # F8_s75 → F8_t76 (new body)
    with BuildSketch(Plane.XZ.offset(-14.61)):
        Polygon((26.321, 8.4), (24.3, 6.379), (24.3, 8.4), align=None)
    extrude(amount=F8_T76_DEPTH)

    # F8_s77 → F8_t78 (cut, symmetric)
    with BuildSketch(Plane.XY.offset(7.4)):
        with Locations((23.9, 7.915)):
            Circle(F8_S77_R)
    extrude(amount=F8_T78_DEPTH, both=True, mode=Mode.SUBTRACT)


with BuildPart() as f1_10:
    add(f1_9.part, clean=False)

    # F8_t73: union F8_tool74
    add(f8_tool74.part)

    # F8_s79 → F8_t80 (revolve)
    with BuildSketch(Plane(origin=(0.880567068, 9.9518273862, 0), x_dir=(0, 0, 1), z_dir=(-0.0881385962, -0.996108221, 0))):
        Polygon((8.4, -17.8483694919), (6.379, -19.8693694919), (8.4, -19.8693694919), align=None)
    with SkipClean():  # cleaning this boolean's faces spoils the solid; the shape is the same uncleaned
        revolve(axis=Axis((23.9, 7.915, 8.4), (0, 0, -1)), revolution_arc=F8_T80_ANGLE)


with BuildPart() as f8_tool82:
    # F8_s83 → F8_t84 (new body)
    with BuildSketch(Plane.XZ.offset(-1.22)):
        Polygon((7.48, 6.379), (5.459, 8.4), (7.48, 8.4), align=None)
    extrude(amount=-F8_T84_DEPTH)

    # F8_s85 → F8_t86 (cut, symmetric)
    with BuildSketch(Plane.XY.offset(7.4)):
        with Locations((7.88, 7.915)):
            Circle(F8_S85_R)
    extrude(amount=F8_T86_DEPTH, both=True, mode=Mode.SUBTRACT)


with BuildPart() as f1_11:
    add(f1_10.part, clean=False)

    # F8_t81: union F8_tool82
    add(f8_tool82.part)

    # F8_s87 → F8_t88 (revolve)
    with BuildSketch(Plane(origin=(0.7561171055, 8.5453421904, 0), x_dir=(0, 0, 1), z_dir=(0.0881385962, 0.996108221, 0))):
        Polygon((6.379, 10.3917157922), (8.4, 12.4127157922), (8.4, 10.3917157922), align=None)
    revolve(axis=Axis((7.88, 7.915, 8.4), (0, 0, -1)), revolution_arc=F8_T88_ANGLE)


with BuildPart() as f8_tool90:
    # F8_s91 → F8_t92 (new body)
    with BuildSketch(Plane.XZ.offset(-5.9328425156)):
        Polygon((7.48, 6.379), (5.459, 8.4), (7.48, 8.4), align=None)
    extrude(amount=-F8_T92_DEPTH)

    # F8_s93 → F8_t94 (cut, symmetric)
    with BuildSketch(Plane.XY.offset(7.4)):
        with Locations((7.88, 7.915)):
            Circle(F8_S93_R)
    extrude(amount=F8_T94_DEPTH, both=True, mode=Mode.SUBTRACT)


with BuildPart() as f1_12:
    add(f1_11.part, clean=False)

    # F8_t89: union F8_tool90
    add(f8_tool90.part)


solid = f1_12.part
